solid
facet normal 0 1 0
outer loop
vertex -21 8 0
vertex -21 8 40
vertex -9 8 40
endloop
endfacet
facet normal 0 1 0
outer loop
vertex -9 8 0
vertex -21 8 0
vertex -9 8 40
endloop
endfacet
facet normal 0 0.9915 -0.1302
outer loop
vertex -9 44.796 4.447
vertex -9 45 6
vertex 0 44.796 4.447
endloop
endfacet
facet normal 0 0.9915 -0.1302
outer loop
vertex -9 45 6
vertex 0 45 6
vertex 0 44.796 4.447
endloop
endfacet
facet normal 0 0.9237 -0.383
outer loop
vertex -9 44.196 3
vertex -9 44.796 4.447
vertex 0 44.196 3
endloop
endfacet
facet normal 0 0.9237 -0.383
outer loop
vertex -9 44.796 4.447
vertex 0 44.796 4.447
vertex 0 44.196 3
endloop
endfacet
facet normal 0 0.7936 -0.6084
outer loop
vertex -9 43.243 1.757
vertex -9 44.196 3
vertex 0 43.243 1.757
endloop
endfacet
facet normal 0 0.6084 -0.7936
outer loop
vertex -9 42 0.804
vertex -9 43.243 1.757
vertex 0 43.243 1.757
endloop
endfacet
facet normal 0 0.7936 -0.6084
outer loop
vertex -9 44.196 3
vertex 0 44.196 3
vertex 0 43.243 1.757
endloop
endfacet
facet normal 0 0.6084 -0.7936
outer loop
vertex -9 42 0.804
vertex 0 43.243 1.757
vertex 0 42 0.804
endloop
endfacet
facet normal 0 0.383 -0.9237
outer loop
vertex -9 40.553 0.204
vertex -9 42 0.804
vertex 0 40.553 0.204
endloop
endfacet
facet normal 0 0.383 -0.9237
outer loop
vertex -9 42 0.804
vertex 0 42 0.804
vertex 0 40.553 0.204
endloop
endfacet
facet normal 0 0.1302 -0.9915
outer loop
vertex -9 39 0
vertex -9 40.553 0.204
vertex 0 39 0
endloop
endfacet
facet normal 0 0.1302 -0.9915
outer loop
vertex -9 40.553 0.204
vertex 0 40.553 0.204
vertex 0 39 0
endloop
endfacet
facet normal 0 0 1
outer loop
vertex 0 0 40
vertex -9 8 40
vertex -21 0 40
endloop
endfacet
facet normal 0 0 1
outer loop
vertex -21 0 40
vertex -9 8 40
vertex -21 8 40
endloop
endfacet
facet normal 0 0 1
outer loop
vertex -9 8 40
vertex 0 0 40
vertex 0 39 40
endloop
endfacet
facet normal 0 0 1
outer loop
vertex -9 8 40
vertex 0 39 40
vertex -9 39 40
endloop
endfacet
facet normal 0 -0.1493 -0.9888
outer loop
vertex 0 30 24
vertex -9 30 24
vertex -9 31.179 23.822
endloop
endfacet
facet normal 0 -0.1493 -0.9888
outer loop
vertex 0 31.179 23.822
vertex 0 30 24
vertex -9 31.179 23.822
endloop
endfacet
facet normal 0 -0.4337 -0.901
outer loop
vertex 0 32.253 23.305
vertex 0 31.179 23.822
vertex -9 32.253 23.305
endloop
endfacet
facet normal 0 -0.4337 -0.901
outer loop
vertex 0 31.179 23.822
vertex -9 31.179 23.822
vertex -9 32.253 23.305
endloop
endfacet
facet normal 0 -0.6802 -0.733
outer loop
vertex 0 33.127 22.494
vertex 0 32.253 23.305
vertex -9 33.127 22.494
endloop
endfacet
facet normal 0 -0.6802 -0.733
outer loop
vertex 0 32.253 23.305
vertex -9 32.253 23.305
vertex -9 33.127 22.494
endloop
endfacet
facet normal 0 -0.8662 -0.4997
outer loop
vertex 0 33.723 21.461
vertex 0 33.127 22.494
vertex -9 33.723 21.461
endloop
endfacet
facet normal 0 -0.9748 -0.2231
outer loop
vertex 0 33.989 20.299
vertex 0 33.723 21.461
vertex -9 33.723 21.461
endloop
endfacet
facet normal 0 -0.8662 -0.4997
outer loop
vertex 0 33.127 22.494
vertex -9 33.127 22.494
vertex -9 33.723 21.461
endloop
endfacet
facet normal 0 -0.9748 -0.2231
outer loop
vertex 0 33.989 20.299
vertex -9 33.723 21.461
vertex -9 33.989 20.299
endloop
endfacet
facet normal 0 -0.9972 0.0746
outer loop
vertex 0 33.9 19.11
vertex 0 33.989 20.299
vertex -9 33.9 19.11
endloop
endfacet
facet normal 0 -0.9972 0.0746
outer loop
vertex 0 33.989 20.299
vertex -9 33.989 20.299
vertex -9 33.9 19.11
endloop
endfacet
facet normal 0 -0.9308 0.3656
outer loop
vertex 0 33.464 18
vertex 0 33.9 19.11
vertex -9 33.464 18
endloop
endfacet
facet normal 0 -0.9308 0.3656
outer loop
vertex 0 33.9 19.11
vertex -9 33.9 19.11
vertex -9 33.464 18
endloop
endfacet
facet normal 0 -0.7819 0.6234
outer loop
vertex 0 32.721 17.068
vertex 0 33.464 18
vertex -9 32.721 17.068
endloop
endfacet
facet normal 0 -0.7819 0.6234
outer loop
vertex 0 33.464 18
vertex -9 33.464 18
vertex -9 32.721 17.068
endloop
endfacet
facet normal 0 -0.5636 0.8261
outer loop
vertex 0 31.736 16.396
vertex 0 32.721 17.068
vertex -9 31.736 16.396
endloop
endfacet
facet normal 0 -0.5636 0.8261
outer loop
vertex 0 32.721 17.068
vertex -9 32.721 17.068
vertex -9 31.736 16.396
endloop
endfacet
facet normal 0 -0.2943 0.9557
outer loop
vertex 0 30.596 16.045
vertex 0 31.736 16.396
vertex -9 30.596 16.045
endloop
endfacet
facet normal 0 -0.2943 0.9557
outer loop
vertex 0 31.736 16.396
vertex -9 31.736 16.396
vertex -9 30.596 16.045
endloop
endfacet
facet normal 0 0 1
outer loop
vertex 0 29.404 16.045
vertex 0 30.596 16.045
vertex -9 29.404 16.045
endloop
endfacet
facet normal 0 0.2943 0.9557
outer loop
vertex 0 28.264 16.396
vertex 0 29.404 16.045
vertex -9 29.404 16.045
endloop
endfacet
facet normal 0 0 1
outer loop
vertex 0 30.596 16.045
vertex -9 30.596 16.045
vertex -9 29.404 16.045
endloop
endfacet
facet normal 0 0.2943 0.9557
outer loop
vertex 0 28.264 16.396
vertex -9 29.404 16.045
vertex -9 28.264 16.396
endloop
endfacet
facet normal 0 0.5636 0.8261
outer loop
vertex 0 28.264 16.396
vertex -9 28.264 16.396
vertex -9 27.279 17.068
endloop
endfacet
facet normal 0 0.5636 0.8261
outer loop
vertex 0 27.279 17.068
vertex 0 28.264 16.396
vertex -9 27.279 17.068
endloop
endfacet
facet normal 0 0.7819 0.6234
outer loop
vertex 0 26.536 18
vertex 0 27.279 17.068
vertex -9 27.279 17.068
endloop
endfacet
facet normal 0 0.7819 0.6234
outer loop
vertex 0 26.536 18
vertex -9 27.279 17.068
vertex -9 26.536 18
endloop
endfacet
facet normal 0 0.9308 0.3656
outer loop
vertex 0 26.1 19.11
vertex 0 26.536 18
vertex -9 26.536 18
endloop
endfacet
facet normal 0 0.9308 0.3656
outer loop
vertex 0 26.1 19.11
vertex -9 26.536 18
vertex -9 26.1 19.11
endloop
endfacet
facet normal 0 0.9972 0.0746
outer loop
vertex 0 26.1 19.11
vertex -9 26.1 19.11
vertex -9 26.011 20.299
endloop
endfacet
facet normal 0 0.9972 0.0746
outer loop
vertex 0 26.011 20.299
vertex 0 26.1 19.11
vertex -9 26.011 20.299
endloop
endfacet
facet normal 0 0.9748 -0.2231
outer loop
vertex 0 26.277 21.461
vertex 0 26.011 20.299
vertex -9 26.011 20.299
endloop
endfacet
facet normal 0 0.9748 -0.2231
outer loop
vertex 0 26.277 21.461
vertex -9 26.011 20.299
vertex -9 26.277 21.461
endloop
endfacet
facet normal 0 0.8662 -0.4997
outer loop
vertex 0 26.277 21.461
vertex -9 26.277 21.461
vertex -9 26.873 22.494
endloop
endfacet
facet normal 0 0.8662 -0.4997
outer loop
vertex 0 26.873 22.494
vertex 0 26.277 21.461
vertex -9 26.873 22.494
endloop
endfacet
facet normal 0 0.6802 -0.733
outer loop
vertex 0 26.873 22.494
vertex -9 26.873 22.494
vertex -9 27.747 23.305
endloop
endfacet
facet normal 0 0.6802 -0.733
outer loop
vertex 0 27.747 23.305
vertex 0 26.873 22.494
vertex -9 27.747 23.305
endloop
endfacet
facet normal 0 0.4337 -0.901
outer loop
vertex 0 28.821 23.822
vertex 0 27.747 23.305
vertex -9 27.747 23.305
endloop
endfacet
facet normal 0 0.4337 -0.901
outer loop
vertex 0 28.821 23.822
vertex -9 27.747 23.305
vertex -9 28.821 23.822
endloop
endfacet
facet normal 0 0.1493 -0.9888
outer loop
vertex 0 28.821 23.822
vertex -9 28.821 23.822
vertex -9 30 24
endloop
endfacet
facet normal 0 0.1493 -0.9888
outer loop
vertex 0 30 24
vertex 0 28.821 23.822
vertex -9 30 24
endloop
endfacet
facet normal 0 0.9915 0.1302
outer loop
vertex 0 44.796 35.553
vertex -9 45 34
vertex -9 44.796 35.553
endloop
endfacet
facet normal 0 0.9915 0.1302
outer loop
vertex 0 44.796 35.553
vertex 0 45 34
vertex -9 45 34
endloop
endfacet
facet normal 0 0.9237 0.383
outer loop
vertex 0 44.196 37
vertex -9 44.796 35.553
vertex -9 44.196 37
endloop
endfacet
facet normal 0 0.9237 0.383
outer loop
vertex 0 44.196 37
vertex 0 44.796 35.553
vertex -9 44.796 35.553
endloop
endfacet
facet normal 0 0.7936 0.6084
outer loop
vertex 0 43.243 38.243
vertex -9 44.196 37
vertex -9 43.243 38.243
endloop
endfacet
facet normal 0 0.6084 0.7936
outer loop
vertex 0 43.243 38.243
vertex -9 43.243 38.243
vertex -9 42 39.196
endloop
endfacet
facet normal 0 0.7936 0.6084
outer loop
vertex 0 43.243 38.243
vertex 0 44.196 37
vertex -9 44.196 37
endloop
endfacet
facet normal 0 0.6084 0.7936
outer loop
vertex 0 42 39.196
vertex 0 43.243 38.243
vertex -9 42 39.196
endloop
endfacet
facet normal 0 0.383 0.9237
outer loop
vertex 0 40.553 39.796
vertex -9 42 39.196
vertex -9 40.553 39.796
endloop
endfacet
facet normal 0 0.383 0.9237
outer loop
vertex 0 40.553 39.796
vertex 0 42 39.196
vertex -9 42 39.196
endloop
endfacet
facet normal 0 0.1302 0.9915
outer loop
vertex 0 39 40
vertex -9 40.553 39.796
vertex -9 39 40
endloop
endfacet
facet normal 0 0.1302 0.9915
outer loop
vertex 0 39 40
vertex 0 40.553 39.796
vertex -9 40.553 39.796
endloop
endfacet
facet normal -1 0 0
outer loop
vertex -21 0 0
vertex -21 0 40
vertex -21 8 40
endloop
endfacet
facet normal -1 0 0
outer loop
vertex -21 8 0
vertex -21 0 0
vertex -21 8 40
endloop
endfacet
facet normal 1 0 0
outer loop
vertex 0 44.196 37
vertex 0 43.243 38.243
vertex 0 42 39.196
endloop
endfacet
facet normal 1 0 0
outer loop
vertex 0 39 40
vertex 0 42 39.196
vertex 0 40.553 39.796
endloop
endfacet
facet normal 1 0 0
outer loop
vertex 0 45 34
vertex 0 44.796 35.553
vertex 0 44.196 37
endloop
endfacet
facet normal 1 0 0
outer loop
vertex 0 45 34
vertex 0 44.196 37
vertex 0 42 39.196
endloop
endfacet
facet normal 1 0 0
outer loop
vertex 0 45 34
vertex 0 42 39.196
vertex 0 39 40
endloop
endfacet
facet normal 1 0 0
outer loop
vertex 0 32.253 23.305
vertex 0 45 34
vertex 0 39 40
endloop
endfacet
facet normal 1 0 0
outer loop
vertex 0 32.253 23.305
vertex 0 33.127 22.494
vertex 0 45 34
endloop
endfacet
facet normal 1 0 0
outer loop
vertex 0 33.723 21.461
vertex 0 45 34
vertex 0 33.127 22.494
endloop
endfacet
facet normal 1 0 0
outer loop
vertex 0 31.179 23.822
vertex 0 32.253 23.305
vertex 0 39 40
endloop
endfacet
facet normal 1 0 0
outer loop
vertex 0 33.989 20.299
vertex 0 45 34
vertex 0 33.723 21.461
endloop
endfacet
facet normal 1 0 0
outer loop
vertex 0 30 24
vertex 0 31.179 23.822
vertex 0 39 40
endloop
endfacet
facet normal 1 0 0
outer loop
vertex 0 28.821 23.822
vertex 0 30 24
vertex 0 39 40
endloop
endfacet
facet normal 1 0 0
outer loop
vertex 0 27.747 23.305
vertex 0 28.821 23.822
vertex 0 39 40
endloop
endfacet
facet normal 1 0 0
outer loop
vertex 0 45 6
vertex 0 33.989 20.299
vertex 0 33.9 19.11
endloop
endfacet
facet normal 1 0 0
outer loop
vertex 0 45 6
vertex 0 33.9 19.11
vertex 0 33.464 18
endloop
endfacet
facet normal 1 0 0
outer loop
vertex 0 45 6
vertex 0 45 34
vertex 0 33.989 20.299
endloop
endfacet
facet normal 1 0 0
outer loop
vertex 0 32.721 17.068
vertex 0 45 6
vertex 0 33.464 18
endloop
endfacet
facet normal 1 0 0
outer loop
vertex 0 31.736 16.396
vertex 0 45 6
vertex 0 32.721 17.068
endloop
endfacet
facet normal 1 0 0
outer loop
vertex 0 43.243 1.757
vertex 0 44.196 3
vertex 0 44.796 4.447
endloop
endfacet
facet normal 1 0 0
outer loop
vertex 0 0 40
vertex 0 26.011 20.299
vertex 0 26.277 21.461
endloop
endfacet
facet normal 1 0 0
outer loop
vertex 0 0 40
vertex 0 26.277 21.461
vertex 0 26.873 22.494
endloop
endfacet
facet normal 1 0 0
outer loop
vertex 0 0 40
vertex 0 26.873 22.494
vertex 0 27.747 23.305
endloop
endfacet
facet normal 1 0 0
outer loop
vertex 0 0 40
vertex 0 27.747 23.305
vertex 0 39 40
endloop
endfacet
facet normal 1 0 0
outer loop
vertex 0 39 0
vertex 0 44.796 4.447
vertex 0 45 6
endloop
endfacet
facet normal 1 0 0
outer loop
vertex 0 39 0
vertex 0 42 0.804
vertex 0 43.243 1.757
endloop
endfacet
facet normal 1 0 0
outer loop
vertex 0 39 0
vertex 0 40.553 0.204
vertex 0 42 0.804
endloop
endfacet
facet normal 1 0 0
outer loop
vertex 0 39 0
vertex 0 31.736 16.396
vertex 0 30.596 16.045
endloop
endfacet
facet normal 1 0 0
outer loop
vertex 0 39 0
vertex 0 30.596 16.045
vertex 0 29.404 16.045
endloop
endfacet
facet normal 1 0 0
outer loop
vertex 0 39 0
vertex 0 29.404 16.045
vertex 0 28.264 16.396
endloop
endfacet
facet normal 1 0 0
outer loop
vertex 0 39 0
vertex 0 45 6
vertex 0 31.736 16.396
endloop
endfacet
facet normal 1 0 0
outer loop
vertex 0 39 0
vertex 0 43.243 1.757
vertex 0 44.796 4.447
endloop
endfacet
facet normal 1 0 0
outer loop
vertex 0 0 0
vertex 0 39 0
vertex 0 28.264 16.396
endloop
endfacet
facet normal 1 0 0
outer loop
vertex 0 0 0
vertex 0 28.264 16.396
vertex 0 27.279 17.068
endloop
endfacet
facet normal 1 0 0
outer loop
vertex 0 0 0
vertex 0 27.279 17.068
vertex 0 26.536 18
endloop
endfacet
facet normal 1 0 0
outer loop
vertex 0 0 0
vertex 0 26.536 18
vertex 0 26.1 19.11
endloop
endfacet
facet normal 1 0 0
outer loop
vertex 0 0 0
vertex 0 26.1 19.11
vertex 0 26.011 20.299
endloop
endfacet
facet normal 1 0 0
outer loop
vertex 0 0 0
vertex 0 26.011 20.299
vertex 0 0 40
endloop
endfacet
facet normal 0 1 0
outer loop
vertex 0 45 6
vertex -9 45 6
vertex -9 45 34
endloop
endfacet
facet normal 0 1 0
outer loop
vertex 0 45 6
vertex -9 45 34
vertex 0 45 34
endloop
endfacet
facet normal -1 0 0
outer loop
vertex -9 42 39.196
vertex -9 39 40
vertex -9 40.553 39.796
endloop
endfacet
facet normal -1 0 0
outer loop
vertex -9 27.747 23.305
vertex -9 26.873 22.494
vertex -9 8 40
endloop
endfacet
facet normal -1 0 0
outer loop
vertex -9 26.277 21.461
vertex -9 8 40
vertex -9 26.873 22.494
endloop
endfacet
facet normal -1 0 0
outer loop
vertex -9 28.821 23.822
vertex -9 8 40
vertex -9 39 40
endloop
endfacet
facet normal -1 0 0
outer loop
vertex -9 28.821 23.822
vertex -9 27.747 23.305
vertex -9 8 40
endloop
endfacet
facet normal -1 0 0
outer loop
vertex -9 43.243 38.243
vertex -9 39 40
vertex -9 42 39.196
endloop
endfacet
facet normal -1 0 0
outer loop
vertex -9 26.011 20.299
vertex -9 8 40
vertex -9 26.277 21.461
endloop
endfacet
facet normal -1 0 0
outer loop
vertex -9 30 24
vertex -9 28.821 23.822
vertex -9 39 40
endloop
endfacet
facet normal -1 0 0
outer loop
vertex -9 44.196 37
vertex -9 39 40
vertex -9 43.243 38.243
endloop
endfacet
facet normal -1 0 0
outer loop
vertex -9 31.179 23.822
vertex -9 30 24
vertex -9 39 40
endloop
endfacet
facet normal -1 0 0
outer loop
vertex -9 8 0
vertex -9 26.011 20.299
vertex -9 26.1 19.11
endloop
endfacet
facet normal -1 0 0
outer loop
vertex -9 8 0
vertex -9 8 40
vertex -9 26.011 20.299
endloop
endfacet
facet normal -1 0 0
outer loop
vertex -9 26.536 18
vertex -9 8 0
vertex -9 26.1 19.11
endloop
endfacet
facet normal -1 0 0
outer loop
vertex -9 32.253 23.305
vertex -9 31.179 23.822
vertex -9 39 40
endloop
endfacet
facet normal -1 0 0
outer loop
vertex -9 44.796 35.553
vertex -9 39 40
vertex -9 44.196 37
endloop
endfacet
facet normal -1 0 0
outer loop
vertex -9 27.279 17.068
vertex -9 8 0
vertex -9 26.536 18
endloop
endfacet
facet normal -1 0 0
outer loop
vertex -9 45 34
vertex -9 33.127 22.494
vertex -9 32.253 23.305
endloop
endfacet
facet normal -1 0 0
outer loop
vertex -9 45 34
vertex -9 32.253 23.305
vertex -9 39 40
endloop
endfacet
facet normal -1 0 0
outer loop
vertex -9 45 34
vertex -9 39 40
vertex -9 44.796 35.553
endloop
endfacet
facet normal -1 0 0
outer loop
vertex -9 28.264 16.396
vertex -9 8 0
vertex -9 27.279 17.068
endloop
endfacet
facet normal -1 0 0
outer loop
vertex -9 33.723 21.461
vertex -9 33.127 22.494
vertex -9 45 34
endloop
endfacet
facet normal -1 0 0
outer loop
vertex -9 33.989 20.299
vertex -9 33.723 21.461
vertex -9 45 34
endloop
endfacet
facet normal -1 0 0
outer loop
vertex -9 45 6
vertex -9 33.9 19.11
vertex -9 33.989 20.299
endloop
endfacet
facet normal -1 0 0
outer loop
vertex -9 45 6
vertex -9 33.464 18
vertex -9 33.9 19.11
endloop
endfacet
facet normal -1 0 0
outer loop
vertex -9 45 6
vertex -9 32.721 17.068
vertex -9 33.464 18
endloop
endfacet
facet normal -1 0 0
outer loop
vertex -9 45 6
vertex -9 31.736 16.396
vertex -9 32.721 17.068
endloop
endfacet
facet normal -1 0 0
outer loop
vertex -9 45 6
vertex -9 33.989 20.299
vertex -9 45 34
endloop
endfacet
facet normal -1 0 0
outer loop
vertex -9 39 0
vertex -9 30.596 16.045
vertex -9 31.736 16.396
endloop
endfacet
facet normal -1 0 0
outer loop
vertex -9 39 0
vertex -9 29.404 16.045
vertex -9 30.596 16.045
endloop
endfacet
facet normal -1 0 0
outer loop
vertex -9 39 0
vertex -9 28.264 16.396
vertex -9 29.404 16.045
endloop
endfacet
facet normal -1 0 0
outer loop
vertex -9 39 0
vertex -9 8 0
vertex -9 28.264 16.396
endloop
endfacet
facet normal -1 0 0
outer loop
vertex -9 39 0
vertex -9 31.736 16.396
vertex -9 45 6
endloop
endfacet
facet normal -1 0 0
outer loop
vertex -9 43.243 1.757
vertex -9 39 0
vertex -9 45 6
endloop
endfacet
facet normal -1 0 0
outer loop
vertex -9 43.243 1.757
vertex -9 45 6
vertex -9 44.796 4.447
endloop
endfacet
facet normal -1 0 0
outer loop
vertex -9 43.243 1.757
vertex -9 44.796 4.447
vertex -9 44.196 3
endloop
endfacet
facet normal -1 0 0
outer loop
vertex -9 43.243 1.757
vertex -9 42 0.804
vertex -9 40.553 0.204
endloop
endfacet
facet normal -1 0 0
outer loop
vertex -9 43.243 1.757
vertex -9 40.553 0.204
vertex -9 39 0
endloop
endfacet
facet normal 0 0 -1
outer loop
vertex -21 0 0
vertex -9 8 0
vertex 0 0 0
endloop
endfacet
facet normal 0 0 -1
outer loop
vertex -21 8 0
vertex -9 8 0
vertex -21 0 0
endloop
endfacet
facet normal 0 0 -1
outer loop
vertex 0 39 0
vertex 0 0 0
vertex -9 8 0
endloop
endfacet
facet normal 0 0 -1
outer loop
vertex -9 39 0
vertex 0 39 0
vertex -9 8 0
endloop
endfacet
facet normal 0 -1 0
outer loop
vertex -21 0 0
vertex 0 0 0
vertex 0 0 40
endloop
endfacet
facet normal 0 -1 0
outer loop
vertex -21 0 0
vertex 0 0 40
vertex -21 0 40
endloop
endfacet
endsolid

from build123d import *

# Parameters (mm, degrees)
EXTRUDE_1_DEPTH     = 40
FILLET_1_R          = 6
SKETCH_2_R          = 4
CUT_EXTRUDE_1_DEPTH = 62.392181913


with BuildPart() as part:
    # 草图1 → 凸台-拉伸1 (new body)
    with BuildSketch(Plane.XY):
        Polygon((0, 0), (-21, 0), (-21, 8), (-9, 8), (-9, 45), (0, 45), align=None)
    extrude(amount=EXTRUDE_1_DEPTH)

    # 圆角1
    fillet_1_edges = [part.edges().sort_by_distance(p)[0] for p in [
        (-4.5, 45, 40),
        (-4.5, 45, 0),
    ]]
    fillet(fillet_1_edges, radius=FILLET_1_R)

    # 草图2 → 切除-拉伸1 (cut, through all)
    with BuildSketch(Plane.ZY.offset(9)):
        with Locations((20, 30)):
            Circle(SKETCH_2_R)
    extrude(amount=-CUT_EXTRUDE_1_DEPTH, mode=Mode.SUBTRACT)


solid = part.part
